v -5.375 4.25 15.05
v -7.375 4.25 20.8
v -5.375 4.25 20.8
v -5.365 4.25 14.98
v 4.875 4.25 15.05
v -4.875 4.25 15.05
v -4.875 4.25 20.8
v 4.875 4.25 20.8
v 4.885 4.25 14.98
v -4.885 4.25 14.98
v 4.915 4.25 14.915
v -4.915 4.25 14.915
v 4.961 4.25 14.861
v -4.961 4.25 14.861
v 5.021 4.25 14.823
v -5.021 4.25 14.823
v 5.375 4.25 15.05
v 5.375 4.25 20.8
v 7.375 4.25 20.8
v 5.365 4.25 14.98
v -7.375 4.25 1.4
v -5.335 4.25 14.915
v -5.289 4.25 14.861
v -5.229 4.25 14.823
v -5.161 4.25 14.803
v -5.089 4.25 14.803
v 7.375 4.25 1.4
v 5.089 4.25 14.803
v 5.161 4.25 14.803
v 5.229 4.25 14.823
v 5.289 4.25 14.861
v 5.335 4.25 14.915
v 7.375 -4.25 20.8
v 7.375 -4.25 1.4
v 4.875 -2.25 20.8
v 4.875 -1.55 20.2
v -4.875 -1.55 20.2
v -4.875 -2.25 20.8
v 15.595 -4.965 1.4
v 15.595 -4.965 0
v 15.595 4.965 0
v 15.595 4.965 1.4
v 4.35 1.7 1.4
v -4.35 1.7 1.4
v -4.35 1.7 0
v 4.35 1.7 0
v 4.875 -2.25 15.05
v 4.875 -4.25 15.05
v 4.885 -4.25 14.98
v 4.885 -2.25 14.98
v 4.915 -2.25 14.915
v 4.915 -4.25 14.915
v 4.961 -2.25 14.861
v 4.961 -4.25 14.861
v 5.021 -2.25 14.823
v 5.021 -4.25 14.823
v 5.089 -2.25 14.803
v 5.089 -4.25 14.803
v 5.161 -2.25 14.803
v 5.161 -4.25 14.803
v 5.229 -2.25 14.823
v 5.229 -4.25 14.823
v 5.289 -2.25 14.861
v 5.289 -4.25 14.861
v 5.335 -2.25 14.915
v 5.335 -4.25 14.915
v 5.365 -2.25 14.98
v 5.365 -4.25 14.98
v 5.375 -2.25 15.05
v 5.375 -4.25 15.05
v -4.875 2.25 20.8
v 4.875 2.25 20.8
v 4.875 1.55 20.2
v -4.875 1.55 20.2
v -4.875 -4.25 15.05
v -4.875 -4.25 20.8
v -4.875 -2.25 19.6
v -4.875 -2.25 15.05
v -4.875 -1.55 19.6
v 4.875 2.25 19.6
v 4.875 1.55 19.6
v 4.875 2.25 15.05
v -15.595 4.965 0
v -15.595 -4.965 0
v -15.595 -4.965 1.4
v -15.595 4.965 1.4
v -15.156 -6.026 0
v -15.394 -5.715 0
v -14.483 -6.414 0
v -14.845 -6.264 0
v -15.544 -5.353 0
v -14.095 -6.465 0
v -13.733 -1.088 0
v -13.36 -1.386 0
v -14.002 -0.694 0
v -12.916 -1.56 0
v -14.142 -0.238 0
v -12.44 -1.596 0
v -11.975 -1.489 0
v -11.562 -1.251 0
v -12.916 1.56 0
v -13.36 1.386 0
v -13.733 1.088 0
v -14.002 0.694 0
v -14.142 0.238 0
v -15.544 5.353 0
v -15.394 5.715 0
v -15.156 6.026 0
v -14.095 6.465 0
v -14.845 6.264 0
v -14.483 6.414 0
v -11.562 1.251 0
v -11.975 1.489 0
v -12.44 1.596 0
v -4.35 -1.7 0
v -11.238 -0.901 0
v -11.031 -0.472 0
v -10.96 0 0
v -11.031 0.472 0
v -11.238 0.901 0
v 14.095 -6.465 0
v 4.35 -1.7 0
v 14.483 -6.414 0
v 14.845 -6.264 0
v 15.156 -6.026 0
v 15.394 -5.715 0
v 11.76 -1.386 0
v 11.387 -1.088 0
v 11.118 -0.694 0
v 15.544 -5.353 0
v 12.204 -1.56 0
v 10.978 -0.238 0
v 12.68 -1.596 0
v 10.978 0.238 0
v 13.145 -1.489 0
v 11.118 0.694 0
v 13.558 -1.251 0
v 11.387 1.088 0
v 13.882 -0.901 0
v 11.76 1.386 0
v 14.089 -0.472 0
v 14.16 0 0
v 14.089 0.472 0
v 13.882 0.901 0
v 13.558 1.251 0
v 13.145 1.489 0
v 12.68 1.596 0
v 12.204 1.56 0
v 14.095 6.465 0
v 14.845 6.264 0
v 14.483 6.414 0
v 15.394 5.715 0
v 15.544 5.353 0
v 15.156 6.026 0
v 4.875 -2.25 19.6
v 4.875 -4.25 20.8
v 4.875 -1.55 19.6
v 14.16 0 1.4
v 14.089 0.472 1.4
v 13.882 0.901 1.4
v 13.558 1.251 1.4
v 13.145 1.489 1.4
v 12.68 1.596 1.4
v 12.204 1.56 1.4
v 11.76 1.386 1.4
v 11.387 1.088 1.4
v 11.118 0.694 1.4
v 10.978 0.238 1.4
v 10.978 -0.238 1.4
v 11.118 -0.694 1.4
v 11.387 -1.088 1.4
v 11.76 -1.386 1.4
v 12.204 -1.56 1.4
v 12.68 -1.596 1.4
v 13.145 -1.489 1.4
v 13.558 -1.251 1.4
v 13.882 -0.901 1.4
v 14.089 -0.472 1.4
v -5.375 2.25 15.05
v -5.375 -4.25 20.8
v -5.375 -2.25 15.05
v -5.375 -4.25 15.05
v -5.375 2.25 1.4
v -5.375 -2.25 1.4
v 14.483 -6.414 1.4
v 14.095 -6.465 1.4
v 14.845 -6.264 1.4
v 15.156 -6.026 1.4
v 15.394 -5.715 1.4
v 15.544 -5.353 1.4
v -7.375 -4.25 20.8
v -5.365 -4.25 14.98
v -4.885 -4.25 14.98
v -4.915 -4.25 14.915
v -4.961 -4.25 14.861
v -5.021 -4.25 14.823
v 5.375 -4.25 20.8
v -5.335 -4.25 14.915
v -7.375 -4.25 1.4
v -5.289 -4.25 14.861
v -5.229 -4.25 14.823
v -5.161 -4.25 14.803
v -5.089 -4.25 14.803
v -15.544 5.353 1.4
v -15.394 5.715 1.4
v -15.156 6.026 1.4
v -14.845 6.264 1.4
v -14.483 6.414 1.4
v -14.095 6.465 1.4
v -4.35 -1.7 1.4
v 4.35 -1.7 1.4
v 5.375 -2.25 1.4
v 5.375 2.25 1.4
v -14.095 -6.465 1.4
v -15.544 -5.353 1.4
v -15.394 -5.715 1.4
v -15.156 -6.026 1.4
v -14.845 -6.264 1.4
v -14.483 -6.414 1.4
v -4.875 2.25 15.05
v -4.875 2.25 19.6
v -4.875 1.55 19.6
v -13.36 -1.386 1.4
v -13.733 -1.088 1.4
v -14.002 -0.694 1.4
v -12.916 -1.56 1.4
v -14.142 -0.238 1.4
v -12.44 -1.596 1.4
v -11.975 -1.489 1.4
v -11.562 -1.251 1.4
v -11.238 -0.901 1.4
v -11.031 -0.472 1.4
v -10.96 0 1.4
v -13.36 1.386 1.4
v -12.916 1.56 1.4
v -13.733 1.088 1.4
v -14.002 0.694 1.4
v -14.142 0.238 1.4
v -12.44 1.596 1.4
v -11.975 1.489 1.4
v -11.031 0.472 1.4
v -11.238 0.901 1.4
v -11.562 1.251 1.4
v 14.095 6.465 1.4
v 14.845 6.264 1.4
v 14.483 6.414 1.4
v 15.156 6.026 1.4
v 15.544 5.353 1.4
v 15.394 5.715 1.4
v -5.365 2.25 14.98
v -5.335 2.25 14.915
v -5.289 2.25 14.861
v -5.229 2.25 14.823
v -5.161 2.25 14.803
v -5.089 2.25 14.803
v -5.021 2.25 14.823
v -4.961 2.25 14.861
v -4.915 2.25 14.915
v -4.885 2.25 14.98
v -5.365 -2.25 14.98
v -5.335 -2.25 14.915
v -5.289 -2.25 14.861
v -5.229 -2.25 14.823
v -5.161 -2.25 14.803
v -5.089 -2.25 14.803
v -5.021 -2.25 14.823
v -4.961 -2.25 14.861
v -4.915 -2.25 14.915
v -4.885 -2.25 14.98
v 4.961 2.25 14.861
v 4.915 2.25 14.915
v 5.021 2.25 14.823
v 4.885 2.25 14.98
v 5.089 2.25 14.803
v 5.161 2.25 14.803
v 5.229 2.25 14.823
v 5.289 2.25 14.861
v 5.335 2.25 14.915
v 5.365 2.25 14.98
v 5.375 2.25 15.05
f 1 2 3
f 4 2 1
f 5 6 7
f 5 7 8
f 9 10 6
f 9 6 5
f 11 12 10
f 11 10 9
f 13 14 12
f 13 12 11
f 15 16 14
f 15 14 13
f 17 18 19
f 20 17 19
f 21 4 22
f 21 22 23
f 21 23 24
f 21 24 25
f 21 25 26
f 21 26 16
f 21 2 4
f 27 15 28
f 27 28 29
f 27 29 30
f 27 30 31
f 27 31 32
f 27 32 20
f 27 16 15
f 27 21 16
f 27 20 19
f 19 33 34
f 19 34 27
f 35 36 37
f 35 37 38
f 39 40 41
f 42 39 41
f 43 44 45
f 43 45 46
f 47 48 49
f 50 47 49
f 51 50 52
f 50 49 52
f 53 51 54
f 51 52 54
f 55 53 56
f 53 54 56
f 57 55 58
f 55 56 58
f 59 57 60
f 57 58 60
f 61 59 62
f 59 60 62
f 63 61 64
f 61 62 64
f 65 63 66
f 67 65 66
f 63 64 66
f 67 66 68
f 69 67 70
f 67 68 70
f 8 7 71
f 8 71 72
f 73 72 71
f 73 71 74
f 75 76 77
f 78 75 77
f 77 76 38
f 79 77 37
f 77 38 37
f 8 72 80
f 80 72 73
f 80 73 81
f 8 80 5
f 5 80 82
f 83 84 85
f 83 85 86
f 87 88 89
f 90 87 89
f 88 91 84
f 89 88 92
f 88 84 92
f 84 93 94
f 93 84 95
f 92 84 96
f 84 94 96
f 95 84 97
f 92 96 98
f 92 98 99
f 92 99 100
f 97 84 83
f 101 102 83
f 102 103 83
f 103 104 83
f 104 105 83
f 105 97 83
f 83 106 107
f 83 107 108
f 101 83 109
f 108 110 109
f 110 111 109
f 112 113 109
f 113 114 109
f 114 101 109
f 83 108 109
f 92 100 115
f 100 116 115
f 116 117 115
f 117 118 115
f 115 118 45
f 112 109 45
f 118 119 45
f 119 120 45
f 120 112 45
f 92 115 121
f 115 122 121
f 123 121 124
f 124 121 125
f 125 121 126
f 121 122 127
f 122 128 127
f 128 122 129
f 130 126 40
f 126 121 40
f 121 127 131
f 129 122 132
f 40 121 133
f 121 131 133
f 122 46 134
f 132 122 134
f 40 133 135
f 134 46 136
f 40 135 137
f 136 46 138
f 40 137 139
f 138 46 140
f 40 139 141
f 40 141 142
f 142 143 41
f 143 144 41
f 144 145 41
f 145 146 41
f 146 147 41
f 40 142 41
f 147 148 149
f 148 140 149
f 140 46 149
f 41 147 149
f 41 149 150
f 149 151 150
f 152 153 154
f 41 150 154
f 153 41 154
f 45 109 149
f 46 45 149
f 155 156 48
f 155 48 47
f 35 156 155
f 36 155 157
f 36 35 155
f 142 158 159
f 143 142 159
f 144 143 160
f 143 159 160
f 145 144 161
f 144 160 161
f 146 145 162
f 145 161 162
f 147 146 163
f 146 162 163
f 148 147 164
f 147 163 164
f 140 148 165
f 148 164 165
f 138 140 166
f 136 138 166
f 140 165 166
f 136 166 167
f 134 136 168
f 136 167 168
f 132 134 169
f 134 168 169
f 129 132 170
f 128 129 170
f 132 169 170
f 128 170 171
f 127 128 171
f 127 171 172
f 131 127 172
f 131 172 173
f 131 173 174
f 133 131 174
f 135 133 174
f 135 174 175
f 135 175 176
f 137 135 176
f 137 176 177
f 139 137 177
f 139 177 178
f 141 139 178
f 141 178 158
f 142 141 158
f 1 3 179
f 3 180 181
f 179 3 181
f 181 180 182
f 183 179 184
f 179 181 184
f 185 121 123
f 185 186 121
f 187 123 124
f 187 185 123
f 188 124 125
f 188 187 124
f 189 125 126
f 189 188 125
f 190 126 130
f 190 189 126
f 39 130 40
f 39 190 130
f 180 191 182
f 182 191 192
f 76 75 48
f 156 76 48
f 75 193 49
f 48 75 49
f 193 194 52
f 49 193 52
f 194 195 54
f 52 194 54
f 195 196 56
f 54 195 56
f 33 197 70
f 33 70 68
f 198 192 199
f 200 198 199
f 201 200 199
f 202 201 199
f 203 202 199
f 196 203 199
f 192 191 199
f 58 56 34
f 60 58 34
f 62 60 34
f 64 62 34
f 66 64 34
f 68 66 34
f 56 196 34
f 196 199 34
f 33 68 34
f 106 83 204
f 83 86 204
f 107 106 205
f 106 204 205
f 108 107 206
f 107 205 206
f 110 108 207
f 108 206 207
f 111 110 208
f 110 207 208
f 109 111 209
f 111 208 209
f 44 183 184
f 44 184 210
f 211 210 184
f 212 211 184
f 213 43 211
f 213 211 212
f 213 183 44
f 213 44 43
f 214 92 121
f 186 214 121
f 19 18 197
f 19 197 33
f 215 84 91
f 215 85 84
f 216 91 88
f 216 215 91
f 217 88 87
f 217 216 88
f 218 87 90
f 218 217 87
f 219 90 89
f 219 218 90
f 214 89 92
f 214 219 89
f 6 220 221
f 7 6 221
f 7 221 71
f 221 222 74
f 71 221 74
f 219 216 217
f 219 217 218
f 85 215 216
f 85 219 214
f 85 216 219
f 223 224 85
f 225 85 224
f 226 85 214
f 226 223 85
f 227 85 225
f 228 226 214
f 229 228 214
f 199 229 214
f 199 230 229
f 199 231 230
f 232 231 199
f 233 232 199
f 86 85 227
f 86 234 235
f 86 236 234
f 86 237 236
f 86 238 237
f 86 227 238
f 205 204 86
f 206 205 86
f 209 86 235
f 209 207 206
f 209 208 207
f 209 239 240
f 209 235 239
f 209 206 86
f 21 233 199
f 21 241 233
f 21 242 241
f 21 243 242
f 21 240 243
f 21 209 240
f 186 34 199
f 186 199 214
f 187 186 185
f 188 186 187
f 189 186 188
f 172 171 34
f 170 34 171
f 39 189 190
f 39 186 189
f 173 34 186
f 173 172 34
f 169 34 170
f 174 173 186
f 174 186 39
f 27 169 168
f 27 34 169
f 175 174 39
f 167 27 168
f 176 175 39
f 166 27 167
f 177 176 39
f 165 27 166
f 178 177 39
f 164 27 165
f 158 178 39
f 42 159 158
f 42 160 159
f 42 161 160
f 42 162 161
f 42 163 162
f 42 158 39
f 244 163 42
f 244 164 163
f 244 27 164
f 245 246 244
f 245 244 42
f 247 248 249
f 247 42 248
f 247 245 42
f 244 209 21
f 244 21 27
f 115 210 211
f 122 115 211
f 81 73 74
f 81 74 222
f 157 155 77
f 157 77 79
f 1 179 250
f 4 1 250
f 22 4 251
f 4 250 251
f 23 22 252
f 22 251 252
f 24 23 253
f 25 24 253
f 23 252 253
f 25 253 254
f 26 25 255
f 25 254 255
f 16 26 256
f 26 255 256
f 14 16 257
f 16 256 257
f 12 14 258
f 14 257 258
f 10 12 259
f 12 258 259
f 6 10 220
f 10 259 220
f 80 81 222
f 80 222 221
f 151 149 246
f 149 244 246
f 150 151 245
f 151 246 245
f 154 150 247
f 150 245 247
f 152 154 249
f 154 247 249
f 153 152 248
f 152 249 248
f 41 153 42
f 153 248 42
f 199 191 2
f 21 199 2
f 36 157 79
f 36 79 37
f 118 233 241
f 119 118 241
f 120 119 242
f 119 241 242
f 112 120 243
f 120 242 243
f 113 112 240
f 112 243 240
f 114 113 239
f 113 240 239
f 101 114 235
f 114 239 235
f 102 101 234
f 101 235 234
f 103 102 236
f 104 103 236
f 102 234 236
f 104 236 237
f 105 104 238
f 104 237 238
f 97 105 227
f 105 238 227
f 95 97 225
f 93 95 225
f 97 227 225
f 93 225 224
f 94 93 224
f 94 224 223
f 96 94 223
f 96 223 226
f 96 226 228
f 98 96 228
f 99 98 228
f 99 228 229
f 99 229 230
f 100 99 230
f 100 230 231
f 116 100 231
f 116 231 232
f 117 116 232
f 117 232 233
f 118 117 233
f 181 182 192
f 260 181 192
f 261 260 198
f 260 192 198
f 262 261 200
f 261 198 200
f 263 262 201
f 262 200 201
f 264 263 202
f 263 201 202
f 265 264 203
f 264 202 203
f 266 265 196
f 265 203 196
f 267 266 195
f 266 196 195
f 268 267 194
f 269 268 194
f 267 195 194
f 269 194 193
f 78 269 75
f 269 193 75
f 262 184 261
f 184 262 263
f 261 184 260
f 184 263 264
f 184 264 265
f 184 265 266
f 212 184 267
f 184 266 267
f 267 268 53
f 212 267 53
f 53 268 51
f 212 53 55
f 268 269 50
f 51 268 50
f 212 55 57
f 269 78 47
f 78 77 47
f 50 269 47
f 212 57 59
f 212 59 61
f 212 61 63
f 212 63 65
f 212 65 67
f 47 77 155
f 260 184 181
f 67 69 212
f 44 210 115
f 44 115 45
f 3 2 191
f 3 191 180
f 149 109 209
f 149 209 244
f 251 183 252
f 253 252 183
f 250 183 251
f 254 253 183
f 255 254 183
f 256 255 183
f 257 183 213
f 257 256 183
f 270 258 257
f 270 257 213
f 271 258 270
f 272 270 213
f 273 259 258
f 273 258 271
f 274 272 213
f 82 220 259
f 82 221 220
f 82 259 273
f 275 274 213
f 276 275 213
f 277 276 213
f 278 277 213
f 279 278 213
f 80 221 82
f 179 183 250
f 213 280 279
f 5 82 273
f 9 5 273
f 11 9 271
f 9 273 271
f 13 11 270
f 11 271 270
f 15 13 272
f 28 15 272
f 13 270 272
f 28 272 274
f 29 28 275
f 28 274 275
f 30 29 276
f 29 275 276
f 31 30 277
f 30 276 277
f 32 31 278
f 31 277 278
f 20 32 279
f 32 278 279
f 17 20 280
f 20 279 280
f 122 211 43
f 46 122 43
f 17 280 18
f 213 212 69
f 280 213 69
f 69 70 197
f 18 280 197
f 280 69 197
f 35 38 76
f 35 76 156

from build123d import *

# Parameters (mm, degrees)
F0_W      = 31.19
F0_H      = 12.93
F1_DEPTH  = 1.4
F2_R      = 1.6
F3_DEPTH  = 1.401
F4_R      = 1.5
F5_W      = 8.7
F5_H      = 3.4
F6_DEPTH  = 1.401
F7_W      = 14.75
F7_H      = 8.5
F8_DEPTH  = 19.4
F9_W      = 10.75
F9_H      = 4.5
F10_DEPTH = 19.4
F12_DEPTH = 10.716
F14_DEPTH = 9.75


with BuildPart() as f1:
    # F0 (on Top) → F1 (new body)
    with BuildSketch(Plane.XY):
        Rectangle(F0_W, F0_H)
    extrude(amount=F1_DEPTH)

    # F2 (on face) → F3 (cut, through all)
    with BuildSketch(Plane.XY.offset(1.4)):
        with Locations((-12.56, 0)):
            Circle(F2_R)
        with Locations((12.56, 0)):
            Circle(F2_R)
    extrude(amount=-F3_DEPTH, mode=Mode.SUBTRACT)

    # F4
    f4_edges = [f1.edges().sort_by_distance(p)[0] for p in [
        (15.595, -6.465, 0.7),
        (15.595, 6.465, 0.7),
        (-15.595, -6.465, 0.7),
        (-15.595, 6.465, 0.7),
    ]]
    fillet(f4_edges, radius=F4_R)

    # F5 (on face) → F6 (cut, through all)
    with BuildSketch(Plane.XY.offset(1.4)):
        Rectangle(F5_W, F5_H)
    extrude(amount=-F6_DEPTH, mode=Mode.SUBTRACT)

    # F7 (on face) → F8 (join)
    with BuildSketch(Plane.XY.offset(1.4)):
        Rectangle(F7_W, F7_H)
    extrude(amount=F8_DEPTH)

    # F9 (on face) → F10 (cut, through all)
    with BuildSketch(Plane.XY.offset(20.8)):
        Rectangle(F9_W, F9_H)
    extrude(amount=-F10_DEPTH, mode=Mode.SUBTRACT)

    # F11 (on face) → F12 (cut, through all)
    with BuildSketch(Plane.XZ.offset(4.25)):
        with BuildLine():
            Line((-4.875, 20.8), (-5.375, 20.8))
            Line((-5.375, 20.8), (-5.375, 15.05))
            ThreePointArc((-5.375, 15.05), (-5.125, 14.8), (-4.875, 15.05))
            Line((-4.875, 15.05), (-4.875, 20.8))
        make_face()
        with BuildLine():
            Line((5.375, 15.05), (5.375, 20.8))
            Line((5.375, 20.8), (4.875, 20.8))
            Line((4.875, 20.8), (4.875, 15.05))
            ThreePointArc((4.875, 15.05), (5.125, 14.8), (5.375, 15.05))
        make_face()
    extrude(amount=-F12_DEPTH, mode=Mode.SUBTRACT)

    # F13 (on face) → F14 (join, through all)
    with BuildSketch(Plane.YZ.offset(4.875)):
        Polygon((-1.55, 20.2), (-2.25, 20.8), (-2.25, 19.6), (-1.55, 19.6), align=None)
        Polygon((2.25, 19.6), (2.25, 20.8), (1.55, 20.2), (1.55, 19.6), align=None)
    extrude(amount=-F14_DEPTH)


solid = f1.part
